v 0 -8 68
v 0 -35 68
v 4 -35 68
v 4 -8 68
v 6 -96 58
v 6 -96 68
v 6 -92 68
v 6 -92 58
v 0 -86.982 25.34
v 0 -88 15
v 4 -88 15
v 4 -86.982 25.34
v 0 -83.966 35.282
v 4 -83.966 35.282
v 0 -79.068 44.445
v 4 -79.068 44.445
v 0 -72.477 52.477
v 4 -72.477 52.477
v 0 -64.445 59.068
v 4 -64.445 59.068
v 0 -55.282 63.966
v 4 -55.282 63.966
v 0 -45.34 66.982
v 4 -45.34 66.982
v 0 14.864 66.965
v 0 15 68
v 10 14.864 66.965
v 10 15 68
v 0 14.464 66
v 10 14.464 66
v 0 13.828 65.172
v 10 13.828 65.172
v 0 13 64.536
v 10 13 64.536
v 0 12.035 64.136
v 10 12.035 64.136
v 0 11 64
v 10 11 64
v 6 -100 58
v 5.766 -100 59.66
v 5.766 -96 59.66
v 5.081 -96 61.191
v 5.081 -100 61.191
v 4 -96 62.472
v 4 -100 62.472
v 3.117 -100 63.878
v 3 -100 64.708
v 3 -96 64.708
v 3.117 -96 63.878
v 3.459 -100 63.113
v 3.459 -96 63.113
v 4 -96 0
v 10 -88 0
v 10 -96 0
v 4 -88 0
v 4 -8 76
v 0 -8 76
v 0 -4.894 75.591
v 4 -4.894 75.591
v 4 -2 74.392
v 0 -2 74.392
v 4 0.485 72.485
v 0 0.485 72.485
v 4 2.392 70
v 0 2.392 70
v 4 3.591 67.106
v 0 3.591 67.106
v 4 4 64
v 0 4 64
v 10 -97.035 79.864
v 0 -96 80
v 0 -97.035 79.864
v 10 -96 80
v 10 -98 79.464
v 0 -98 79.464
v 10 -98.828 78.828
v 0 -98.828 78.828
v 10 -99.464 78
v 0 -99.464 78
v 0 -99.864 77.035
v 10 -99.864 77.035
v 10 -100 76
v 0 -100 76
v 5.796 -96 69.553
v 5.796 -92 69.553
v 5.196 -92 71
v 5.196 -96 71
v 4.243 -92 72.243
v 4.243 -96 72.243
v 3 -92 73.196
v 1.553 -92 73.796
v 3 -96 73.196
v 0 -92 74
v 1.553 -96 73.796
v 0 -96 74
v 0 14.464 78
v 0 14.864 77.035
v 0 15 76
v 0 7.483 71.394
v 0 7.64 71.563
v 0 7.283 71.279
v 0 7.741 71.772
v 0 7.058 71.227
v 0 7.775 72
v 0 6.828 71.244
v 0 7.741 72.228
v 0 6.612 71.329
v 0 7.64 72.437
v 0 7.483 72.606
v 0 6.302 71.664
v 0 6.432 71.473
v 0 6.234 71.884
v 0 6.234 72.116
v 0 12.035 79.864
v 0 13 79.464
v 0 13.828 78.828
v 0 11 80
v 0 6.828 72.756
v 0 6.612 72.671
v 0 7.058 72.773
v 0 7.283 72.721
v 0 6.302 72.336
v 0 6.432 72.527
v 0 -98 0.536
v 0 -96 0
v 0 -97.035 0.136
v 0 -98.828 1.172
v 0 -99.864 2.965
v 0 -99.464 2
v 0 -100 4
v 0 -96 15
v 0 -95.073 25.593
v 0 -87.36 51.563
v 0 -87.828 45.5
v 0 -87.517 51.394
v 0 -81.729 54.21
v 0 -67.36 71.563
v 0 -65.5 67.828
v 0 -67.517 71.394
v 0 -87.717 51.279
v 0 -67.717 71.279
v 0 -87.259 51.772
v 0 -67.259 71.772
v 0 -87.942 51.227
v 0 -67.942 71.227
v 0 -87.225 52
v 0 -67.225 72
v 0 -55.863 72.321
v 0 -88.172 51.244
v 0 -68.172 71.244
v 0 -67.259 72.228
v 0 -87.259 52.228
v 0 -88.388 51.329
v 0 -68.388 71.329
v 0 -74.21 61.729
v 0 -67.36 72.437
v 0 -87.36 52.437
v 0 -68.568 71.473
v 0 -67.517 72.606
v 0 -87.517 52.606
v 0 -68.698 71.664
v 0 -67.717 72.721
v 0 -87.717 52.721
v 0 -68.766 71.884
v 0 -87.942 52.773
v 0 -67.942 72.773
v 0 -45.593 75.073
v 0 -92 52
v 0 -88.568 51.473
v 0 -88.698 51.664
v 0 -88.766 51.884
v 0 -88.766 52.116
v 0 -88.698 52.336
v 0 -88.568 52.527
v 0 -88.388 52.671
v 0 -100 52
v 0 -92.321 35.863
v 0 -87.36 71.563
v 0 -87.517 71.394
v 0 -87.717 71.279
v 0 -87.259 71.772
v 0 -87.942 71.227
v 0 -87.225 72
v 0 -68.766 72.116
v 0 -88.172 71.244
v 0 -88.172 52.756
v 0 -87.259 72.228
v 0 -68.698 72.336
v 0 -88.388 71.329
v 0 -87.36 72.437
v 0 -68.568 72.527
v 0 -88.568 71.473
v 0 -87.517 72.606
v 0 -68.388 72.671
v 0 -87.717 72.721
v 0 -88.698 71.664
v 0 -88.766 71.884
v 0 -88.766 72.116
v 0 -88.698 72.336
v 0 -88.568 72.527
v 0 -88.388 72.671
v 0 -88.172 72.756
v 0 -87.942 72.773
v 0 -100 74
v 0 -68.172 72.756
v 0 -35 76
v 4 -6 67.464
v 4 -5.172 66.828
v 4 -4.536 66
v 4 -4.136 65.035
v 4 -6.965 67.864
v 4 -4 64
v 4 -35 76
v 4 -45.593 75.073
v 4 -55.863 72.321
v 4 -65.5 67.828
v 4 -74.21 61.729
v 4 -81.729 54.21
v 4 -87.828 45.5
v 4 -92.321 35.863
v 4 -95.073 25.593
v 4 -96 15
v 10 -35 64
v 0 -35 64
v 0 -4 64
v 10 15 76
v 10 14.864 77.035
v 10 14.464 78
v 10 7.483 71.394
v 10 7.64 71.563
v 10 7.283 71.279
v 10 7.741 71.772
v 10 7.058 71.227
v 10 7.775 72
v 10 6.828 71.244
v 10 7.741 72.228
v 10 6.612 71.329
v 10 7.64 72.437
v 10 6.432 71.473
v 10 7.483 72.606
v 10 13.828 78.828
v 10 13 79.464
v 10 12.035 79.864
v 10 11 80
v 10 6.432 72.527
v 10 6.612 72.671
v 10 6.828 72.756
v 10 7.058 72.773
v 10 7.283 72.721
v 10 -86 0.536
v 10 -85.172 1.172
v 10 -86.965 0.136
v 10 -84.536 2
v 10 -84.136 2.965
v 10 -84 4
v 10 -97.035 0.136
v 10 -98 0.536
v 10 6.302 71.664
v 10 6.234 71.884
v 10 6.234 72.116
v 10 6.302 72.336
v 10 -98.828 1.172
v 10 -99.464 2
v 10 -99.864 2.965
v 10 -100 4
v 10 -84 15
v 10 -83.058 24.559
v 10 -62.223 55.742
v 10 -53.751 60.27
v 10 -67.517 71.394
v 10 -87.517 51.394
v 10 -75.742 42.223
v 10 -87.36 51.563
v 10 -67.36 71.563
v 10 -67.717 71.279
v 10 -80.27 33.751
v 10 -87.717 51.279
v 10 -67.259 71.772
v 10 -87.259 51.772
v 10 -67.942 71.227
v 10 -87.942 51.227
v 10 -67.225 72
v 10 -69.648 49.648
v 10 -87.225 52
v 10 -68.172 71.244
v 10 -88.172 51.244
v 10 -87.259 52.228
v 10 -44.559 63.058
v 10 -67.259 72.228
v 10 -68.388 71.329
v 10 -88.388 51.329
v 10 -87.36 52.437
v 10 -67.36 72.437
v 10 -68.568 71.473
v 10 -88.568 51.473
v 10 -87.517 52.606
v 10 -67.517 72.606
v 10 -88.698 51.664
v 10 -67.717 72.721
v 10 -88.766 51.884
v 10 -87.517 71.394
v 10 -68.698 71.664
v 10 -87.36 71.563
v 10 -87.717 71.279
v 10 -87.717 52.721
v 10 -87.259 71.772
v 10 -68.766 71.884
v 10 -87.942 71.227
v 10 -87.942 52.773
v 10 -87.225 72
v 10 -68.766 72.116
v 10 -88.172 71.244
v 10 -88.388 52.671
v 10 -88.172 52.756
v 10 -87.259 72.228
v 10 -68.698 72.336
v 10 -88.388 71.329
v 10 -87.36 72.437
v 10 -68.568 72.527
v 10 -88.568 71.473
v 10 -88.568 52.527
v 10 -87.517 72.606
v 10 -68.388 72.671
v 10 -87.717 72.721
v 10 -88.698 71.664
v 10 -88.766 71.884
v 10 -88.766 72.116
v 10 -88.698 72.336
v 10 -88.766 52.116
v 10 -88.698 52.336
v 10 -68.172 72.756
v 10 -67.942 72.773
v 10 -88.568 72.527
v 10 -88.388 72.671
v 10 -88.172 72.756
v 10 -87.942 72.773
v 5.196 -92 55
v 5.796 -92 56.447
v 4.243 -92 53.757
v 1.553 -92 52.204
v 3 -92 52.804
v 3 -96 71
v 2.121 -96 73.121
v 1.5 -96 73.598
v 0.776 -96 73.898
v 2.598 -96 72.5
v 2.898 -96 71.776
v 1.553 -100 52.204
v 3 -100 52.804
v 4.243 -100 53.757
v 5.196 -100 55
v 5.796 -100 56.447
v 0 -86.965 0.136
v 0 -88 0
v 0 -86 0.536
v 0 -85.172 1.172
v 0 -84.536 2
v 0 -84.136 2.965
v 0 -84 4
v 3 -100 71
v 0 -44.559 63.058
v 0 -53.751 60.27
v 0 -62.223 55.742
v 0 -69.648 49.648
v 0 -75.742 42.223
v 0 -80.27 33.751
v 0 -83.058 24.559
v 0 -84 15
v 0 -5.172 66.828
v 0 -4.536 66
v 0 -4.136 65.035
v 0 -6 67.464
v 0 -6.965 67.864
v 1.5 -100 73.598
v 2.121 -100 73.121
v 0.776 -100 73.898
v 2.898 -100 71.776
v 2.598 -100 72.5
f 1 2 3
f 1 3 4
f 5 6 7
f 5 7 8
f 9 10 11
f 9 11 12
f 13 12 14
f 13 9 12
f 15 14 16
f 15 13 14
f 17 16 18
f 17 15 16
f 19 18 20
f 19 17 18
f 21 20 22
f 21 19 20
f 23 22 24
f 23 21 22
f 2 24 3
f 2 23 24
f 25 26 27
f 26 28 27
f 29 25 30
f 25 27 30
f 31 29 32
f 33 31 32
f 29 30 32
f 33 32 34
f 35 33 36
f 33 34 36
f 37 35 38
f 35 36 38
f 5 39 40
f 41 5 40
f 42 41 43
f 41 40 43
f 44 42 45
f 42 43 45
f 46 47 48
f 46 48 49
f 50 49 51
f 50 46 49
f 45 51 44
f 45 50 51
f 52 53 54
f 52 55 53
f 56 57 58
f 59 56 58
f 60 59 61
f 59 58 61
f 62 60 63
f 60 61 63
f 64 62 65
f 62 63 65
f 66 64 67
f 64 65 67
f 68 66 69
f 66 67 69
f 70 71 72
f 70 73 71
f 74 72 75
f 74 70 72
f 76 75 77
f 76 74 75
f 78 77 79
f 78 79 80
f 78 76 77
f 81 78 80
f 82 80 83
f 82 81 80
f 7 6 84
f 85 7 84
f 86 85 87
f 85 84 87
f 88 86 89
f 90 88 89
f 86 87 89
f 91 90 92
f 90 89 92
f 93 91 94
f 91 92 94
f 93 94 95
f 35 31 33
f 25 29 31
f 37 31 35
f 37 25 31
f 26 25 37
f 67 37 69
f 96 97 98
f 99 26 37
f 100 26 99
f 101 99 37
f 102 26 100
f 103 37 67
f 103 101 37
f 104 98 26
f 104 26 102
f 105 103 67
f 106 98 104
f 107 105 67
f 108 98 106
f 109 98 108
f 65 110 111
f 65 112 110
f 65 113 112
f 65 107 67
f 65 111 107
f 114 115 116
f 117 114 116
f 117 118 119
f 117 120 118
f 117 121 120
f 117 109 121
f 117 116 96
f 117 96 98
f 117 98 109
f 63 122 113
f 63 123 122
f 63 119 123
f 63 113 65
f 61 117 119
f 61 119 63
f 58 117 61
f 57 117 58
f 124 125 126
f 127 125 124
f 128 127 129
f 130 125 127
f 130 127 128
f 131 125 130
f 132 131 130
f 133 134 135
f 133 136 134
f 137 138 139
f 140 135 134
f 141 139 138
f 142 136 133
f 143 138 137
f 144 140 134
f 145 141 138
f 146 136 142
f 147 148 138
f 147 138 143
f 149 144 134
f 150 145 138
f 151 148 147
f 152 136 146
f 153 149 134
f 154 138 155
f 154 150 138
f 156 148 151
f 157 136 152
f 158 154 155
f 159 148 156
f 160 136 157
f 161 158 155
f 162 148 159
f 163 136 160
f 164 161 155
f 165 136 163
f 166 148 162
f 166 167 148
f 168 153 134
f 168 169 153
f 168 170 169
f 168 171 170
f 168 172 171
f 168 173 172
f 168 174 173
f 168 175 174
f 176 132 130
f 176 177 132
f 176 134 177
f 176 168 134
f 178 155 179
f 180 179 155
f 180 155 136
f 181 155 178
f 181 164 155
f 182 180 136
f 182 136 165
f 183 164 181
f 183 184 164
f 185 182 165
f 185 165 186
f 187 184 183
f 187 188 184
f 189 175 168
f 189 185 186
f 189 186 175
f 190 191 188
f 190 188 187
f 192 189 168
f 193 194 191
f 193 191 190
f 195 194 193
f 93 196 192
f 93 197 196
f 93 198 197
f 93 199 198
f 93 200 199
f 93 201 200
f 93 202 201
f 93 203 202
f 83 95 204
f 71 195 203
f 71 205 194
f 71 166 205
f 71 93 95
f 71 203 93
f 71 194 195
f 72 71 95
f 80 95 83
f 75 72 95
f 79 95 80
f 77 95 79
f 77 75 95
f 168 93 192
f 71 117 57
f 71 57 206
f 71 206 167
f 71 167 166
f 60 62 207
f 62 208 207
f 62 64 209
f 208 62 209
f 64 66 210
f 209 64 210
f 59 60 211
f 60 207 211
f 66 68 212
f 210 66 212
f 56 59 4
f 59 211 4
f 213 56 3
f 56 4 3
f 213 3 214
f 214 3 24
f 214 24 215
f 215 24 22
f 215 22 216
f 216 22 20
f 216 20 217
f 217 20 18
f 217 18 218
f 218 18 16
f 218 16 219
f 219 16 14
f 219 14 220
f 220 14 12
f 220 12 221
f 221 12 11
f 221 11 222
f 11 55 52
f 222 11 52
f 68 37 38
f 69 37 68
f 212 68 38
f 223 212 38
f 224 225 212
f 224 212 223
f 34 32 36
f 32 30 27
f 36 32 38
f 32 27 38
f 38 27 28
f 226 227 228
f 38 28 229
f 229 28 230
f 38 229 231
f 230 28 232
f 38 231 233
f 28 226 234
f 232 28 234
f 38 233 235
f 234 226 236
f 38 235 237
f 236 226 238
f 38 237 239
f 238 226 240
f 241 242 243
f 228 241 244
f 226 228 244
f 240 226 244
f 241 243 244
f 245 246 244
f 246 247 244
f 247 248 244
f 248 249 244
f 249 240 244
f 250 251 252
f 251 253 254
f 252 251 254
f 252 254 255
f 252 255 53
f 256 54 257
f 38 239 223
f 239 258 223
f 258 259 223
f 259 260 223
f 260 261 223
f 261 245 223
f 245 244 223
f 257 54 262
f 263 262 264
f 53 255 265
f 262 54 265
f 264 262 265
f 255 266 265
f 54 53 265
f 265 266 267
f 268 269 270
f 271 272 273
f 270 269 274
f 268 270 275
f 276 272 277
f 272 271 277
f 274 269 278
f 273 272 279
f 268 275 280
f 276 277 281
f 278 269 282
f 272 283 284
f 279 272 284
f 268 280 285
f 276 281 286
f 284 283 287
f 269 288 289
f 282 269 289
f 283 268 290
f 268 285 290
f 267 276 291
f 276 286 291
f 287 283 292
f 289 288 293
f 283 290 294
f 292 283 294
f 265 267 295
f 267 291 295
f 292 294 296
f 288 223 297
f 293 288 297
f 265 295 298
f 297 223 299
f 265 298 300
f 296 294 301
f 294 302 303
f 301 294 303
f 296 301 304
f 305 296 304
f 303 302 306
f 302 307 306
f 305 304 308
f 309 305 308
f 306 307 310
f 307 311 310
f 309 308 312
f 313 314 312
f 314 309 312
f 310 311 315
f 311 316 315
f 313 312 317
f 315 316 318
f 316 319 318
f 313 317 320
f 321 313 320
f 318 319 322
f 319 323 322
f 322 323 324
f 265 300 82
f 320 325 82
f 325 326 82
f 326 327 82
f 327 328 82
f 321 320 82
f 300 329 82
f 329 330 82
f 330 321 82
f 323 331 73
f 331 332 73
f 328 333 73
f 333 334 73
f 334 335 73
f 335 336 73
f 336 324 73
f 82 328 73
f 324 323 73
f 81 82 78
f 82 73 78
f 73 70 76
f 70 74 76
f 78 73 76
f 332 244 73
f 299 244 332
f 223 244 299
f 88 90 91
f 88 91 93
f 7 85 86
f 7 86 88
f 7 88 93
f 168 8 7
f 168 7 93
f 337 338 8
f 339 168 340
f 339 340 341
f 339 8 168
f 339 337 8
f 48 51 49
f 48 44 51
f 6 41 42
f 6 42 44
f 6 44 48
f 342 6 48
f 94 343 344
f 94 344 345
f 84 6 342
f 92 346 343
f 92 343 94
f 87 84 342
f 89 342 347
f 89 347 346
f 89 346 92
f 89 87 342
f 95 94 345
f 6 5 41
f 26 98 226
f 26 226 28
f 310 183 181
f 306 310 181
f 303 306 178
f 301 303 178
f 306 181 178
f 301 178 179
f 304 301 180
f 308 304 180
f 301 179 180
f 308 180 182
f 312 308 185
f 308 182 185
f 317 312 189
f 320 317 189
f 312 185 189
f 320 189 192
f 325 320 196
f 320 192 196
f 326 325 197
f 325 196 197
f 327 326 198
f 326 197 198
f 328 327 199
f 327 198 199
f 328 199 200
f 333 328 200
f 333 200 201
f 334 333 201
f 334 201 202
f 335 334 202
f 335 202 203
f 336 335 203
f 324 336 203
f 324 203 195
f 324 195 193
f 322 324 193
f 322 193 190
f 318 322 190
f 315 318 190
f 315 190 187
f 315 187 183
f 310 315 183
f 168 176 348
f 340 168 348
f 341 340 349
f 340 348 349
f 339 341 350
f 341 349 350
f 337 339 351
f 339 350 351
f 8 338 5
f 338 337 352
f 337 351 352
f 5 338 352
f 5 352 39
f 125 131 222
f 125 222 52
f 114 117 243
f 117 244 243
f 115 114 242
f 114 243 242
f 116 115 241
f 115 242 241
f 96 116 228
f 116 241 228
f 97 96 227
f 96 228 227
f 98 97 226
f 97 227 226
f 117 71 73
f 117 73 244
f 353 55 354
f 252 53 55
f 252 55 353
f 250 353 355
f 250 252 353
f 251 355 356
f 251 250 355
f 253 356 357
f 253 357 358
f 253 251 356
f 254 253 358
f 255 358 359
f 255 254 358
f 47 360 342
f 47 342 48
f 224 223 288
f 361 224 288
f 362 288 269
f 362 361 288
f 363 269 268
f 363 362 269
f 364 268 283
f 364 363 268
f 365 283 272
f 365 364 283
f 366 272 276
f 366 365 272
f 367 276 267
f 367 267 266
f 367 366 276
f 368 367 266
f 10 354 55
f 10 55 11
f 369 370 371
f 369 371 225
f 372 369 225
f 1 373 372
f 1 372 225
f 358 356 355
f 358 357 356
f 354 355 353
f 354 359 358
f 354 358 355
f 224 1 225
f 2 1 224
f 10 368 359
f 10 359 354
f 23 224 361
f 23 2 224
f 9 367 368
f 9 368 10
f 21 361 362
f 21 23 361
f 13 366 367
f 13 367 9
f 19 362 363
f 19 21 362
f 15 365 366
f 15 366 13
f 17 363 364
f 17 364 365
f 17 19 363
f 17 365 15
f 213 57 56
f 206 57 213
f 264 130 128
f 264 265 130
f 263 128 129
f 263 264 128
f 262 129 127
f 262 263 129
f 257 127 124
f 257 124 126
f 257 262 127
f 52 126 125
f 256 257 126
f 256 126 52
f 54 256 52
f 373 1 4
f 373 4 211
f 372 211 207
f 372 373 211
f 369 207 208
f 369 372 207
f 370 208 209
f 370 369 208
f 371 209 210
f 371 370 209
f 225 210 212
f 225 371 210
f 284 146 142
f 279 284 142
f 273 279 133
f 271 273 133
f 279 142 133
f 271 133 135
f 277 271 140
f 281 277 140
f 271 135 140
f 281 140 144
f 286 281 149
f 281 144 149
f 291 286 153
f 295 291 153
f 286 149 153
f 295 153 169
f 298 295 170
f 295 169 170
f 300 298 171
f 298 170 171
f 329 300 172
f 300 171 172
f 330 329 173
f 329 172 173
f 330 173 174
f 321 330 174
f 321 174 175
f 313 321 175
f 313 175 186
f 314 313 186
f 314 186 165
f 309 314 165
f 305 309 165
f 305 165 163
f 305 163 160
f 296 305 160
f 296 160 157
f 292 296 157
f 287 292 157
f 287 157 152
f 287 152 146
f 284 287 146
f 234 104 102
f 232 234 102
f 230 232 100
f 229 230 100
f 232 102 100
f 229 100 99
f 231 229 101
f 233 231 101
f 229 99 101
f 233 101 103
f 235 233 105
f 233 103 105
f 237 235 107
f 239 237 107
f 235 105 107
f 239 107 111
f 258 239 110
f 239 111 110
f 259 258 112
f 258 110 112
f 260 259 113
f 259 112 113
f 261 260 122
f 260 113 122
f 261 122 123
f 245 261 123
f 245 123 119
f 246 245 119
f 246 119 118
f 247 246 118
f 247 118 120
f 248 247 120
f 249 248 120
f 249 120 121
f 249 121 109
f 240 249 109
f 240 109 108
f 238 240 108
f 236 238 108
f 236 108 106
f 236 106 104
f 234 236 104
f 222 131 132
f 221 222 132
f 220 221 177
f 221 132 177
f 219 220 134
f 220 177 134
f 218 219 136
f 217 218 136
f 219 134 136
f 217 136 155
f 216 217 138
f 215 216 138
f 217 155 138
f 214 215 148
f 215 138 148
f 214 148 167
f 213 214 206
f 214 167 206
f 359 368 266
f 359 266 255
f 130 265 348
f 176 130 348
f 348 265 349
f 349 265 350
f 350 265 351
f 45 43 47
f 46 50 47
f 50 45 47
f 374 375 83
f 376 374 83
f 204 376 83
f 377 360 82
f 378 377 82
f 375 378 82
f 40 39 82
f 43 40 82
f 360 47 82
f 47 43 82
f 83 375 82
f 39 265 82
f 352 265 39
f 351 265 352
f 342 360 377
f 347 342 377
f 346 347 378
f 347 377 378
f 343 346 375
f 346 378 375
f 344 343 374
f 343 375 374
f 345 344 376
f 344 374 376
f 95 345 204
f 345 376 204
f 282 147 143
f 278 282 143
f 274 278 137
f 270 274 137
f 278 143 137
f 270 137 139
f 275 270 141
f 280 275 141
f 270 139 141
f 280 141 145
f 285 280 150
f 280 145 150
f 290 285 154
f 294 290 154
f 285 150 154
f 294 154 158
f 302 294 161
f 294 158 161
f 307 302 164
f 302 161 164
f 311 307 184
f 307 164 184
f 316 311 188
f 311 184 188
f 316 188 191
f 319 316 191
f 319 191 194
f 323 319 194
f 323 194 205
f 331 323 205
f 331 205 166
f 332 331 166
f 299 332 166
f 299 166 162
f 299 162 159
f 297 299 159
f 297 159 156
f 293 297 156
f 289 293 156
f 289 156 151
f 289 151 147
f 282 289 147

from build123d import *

# Parameters (mm, degrees)
PAD003_DEPTH    = 10
POCKET003_DEPTH = 4
SKETCH008_R     = 0.775
POCKET004_DEPTH = 10.001
FILLET_R        = 4
POCKET005_DEPTH = 8
PAD004_DEPTH    = 4


with BuildPart() as part:
    # Sketch006 → Pad003 (new body)
    with BuildSketch(Plane.YZ):
        with BuildLine():
            Line((-100, 80), (15, 80))
            Line((15, 80), (15, 64))
            Line((15, 64), (-35, 64))
            ThreePointArc((-35, 64), (-69.648232, 49.648232), (-84, 15))
            Line((-84, 15), (-84, 0))
            Line((-84, 0), (-100, 0))
            Line((-100, 0), (-100, 80))
        make_face()
    extrude(amount=PAD003_DEPTH)

    # Sketch007 (on Face8 of Pad003) → Pocket003 (cut)
    with BuildSketch(Plane(origin=(0, 0, 0), x_dir=(0, 1, 0), z_dir=(-1, 0, 0))):
        with BuildLine():
            Line((-88, 0), (-88, -15))
            ThreePointArc((-88, -15), (-72.476659, -52.476659), (-35, -68))
            Line((-35, -68), (-8, -68))
            ThreePointArc((-8, -68), (-5.171573, -66.828427), (-4, -64))
            Line((-4, -64), (4, -64))
            ThreePointArc((-8, -76), (0.485281, -72.485281), (4, -64))
            Line((-8, -76), (-35, -76))
            ThreePointArc((-96, -15), (-78.133514, -58.133514), (-35, -76))
            Line((-96, -15), (-96, 0))
            Line((-96, 0), (-88, 0))
        make_face()
    extrude(amount=-POCKET003_DEPTH, mode=Mode.SUBTRACT)

    # Sketch008 (on Face4 of Pocket003) → Pocket004 (cut, through all)
    with BuildSketch(Plane(origin=(0, 0, 0), x_dir=(0, 1, 0), z_dir=(-1, 0, 0))):
        with Locations((-88, -52)):
            Circle(SKETCH008_R)
        with Locations((-68, -72)):
            Circle(SKETCH008_R)
        with Locations((-88, -72)):
            Circle(SKETCH008_R)
        with Locations((7, -72)):
            Circle(SKETCH008_R)
    extrude(amount=-POCKET004_DEPTH, mode=Mode.SUBTRACT)

    # Fillet
    fillet_edges = [part.edges().sort_by_distance(p)[0] for p in [
        (5, 15, 64),
        (5, 15, 80),
        (5, -100, 80),
        (5, -100, 0),
        (5, -84, 0),
    ]]
    fillet(fillet_edges, radius=FILLET_R)

    # Sketch009 (on Face6 of Fillet) → Pocket005 (cut)
    with BuildSketch(Plane(origin=(0, -100, 0), x_dir=(0, 0, -1), z_dir=(0, -1, 0))):
        with BuildLine():
            ThreePointArc((-68, 6), (-74, 0), (-68, -6))
            Line((-68, -6), (-58, -6))
            ThreePointArc((-58, -6), (-52, 0), (-58, 6))
            Line((-68, 6), (-58, 6))
        make_face()
    extrude(amount=-POCKET005_DEPTH, mode=Mode.SUBTRACT)

    # Sketch010 (on Face14 of Pocket005) → Pad004 (join)
    with BuildSketch(Plane(origin=(0, -100, 0), x_dir=(0, 0, -1), z_dir=(0, -1, 0))):
        with BuildLine():
            ThreePointArc((-71, 3), (-73.12132, 2.12132), (-74, 0))
            ThreePointArc((-68, 6), (-72.242641, 4.242641), (-74, 0))
            Line((-58, 6), (-68, 6))
            ThreePointArc((-58, 6), (-60.44949, 5.477226), (-62.472136, 4))
            ThreePointArc((-64.708204, 3), (-63.483459, 3.261387), (-62.472136, 4))
            Line((-71, 3), (-64.708204, 3))
        make_face()
    extrude(amount=-PAD004_DEPTH)


solid = part.part
